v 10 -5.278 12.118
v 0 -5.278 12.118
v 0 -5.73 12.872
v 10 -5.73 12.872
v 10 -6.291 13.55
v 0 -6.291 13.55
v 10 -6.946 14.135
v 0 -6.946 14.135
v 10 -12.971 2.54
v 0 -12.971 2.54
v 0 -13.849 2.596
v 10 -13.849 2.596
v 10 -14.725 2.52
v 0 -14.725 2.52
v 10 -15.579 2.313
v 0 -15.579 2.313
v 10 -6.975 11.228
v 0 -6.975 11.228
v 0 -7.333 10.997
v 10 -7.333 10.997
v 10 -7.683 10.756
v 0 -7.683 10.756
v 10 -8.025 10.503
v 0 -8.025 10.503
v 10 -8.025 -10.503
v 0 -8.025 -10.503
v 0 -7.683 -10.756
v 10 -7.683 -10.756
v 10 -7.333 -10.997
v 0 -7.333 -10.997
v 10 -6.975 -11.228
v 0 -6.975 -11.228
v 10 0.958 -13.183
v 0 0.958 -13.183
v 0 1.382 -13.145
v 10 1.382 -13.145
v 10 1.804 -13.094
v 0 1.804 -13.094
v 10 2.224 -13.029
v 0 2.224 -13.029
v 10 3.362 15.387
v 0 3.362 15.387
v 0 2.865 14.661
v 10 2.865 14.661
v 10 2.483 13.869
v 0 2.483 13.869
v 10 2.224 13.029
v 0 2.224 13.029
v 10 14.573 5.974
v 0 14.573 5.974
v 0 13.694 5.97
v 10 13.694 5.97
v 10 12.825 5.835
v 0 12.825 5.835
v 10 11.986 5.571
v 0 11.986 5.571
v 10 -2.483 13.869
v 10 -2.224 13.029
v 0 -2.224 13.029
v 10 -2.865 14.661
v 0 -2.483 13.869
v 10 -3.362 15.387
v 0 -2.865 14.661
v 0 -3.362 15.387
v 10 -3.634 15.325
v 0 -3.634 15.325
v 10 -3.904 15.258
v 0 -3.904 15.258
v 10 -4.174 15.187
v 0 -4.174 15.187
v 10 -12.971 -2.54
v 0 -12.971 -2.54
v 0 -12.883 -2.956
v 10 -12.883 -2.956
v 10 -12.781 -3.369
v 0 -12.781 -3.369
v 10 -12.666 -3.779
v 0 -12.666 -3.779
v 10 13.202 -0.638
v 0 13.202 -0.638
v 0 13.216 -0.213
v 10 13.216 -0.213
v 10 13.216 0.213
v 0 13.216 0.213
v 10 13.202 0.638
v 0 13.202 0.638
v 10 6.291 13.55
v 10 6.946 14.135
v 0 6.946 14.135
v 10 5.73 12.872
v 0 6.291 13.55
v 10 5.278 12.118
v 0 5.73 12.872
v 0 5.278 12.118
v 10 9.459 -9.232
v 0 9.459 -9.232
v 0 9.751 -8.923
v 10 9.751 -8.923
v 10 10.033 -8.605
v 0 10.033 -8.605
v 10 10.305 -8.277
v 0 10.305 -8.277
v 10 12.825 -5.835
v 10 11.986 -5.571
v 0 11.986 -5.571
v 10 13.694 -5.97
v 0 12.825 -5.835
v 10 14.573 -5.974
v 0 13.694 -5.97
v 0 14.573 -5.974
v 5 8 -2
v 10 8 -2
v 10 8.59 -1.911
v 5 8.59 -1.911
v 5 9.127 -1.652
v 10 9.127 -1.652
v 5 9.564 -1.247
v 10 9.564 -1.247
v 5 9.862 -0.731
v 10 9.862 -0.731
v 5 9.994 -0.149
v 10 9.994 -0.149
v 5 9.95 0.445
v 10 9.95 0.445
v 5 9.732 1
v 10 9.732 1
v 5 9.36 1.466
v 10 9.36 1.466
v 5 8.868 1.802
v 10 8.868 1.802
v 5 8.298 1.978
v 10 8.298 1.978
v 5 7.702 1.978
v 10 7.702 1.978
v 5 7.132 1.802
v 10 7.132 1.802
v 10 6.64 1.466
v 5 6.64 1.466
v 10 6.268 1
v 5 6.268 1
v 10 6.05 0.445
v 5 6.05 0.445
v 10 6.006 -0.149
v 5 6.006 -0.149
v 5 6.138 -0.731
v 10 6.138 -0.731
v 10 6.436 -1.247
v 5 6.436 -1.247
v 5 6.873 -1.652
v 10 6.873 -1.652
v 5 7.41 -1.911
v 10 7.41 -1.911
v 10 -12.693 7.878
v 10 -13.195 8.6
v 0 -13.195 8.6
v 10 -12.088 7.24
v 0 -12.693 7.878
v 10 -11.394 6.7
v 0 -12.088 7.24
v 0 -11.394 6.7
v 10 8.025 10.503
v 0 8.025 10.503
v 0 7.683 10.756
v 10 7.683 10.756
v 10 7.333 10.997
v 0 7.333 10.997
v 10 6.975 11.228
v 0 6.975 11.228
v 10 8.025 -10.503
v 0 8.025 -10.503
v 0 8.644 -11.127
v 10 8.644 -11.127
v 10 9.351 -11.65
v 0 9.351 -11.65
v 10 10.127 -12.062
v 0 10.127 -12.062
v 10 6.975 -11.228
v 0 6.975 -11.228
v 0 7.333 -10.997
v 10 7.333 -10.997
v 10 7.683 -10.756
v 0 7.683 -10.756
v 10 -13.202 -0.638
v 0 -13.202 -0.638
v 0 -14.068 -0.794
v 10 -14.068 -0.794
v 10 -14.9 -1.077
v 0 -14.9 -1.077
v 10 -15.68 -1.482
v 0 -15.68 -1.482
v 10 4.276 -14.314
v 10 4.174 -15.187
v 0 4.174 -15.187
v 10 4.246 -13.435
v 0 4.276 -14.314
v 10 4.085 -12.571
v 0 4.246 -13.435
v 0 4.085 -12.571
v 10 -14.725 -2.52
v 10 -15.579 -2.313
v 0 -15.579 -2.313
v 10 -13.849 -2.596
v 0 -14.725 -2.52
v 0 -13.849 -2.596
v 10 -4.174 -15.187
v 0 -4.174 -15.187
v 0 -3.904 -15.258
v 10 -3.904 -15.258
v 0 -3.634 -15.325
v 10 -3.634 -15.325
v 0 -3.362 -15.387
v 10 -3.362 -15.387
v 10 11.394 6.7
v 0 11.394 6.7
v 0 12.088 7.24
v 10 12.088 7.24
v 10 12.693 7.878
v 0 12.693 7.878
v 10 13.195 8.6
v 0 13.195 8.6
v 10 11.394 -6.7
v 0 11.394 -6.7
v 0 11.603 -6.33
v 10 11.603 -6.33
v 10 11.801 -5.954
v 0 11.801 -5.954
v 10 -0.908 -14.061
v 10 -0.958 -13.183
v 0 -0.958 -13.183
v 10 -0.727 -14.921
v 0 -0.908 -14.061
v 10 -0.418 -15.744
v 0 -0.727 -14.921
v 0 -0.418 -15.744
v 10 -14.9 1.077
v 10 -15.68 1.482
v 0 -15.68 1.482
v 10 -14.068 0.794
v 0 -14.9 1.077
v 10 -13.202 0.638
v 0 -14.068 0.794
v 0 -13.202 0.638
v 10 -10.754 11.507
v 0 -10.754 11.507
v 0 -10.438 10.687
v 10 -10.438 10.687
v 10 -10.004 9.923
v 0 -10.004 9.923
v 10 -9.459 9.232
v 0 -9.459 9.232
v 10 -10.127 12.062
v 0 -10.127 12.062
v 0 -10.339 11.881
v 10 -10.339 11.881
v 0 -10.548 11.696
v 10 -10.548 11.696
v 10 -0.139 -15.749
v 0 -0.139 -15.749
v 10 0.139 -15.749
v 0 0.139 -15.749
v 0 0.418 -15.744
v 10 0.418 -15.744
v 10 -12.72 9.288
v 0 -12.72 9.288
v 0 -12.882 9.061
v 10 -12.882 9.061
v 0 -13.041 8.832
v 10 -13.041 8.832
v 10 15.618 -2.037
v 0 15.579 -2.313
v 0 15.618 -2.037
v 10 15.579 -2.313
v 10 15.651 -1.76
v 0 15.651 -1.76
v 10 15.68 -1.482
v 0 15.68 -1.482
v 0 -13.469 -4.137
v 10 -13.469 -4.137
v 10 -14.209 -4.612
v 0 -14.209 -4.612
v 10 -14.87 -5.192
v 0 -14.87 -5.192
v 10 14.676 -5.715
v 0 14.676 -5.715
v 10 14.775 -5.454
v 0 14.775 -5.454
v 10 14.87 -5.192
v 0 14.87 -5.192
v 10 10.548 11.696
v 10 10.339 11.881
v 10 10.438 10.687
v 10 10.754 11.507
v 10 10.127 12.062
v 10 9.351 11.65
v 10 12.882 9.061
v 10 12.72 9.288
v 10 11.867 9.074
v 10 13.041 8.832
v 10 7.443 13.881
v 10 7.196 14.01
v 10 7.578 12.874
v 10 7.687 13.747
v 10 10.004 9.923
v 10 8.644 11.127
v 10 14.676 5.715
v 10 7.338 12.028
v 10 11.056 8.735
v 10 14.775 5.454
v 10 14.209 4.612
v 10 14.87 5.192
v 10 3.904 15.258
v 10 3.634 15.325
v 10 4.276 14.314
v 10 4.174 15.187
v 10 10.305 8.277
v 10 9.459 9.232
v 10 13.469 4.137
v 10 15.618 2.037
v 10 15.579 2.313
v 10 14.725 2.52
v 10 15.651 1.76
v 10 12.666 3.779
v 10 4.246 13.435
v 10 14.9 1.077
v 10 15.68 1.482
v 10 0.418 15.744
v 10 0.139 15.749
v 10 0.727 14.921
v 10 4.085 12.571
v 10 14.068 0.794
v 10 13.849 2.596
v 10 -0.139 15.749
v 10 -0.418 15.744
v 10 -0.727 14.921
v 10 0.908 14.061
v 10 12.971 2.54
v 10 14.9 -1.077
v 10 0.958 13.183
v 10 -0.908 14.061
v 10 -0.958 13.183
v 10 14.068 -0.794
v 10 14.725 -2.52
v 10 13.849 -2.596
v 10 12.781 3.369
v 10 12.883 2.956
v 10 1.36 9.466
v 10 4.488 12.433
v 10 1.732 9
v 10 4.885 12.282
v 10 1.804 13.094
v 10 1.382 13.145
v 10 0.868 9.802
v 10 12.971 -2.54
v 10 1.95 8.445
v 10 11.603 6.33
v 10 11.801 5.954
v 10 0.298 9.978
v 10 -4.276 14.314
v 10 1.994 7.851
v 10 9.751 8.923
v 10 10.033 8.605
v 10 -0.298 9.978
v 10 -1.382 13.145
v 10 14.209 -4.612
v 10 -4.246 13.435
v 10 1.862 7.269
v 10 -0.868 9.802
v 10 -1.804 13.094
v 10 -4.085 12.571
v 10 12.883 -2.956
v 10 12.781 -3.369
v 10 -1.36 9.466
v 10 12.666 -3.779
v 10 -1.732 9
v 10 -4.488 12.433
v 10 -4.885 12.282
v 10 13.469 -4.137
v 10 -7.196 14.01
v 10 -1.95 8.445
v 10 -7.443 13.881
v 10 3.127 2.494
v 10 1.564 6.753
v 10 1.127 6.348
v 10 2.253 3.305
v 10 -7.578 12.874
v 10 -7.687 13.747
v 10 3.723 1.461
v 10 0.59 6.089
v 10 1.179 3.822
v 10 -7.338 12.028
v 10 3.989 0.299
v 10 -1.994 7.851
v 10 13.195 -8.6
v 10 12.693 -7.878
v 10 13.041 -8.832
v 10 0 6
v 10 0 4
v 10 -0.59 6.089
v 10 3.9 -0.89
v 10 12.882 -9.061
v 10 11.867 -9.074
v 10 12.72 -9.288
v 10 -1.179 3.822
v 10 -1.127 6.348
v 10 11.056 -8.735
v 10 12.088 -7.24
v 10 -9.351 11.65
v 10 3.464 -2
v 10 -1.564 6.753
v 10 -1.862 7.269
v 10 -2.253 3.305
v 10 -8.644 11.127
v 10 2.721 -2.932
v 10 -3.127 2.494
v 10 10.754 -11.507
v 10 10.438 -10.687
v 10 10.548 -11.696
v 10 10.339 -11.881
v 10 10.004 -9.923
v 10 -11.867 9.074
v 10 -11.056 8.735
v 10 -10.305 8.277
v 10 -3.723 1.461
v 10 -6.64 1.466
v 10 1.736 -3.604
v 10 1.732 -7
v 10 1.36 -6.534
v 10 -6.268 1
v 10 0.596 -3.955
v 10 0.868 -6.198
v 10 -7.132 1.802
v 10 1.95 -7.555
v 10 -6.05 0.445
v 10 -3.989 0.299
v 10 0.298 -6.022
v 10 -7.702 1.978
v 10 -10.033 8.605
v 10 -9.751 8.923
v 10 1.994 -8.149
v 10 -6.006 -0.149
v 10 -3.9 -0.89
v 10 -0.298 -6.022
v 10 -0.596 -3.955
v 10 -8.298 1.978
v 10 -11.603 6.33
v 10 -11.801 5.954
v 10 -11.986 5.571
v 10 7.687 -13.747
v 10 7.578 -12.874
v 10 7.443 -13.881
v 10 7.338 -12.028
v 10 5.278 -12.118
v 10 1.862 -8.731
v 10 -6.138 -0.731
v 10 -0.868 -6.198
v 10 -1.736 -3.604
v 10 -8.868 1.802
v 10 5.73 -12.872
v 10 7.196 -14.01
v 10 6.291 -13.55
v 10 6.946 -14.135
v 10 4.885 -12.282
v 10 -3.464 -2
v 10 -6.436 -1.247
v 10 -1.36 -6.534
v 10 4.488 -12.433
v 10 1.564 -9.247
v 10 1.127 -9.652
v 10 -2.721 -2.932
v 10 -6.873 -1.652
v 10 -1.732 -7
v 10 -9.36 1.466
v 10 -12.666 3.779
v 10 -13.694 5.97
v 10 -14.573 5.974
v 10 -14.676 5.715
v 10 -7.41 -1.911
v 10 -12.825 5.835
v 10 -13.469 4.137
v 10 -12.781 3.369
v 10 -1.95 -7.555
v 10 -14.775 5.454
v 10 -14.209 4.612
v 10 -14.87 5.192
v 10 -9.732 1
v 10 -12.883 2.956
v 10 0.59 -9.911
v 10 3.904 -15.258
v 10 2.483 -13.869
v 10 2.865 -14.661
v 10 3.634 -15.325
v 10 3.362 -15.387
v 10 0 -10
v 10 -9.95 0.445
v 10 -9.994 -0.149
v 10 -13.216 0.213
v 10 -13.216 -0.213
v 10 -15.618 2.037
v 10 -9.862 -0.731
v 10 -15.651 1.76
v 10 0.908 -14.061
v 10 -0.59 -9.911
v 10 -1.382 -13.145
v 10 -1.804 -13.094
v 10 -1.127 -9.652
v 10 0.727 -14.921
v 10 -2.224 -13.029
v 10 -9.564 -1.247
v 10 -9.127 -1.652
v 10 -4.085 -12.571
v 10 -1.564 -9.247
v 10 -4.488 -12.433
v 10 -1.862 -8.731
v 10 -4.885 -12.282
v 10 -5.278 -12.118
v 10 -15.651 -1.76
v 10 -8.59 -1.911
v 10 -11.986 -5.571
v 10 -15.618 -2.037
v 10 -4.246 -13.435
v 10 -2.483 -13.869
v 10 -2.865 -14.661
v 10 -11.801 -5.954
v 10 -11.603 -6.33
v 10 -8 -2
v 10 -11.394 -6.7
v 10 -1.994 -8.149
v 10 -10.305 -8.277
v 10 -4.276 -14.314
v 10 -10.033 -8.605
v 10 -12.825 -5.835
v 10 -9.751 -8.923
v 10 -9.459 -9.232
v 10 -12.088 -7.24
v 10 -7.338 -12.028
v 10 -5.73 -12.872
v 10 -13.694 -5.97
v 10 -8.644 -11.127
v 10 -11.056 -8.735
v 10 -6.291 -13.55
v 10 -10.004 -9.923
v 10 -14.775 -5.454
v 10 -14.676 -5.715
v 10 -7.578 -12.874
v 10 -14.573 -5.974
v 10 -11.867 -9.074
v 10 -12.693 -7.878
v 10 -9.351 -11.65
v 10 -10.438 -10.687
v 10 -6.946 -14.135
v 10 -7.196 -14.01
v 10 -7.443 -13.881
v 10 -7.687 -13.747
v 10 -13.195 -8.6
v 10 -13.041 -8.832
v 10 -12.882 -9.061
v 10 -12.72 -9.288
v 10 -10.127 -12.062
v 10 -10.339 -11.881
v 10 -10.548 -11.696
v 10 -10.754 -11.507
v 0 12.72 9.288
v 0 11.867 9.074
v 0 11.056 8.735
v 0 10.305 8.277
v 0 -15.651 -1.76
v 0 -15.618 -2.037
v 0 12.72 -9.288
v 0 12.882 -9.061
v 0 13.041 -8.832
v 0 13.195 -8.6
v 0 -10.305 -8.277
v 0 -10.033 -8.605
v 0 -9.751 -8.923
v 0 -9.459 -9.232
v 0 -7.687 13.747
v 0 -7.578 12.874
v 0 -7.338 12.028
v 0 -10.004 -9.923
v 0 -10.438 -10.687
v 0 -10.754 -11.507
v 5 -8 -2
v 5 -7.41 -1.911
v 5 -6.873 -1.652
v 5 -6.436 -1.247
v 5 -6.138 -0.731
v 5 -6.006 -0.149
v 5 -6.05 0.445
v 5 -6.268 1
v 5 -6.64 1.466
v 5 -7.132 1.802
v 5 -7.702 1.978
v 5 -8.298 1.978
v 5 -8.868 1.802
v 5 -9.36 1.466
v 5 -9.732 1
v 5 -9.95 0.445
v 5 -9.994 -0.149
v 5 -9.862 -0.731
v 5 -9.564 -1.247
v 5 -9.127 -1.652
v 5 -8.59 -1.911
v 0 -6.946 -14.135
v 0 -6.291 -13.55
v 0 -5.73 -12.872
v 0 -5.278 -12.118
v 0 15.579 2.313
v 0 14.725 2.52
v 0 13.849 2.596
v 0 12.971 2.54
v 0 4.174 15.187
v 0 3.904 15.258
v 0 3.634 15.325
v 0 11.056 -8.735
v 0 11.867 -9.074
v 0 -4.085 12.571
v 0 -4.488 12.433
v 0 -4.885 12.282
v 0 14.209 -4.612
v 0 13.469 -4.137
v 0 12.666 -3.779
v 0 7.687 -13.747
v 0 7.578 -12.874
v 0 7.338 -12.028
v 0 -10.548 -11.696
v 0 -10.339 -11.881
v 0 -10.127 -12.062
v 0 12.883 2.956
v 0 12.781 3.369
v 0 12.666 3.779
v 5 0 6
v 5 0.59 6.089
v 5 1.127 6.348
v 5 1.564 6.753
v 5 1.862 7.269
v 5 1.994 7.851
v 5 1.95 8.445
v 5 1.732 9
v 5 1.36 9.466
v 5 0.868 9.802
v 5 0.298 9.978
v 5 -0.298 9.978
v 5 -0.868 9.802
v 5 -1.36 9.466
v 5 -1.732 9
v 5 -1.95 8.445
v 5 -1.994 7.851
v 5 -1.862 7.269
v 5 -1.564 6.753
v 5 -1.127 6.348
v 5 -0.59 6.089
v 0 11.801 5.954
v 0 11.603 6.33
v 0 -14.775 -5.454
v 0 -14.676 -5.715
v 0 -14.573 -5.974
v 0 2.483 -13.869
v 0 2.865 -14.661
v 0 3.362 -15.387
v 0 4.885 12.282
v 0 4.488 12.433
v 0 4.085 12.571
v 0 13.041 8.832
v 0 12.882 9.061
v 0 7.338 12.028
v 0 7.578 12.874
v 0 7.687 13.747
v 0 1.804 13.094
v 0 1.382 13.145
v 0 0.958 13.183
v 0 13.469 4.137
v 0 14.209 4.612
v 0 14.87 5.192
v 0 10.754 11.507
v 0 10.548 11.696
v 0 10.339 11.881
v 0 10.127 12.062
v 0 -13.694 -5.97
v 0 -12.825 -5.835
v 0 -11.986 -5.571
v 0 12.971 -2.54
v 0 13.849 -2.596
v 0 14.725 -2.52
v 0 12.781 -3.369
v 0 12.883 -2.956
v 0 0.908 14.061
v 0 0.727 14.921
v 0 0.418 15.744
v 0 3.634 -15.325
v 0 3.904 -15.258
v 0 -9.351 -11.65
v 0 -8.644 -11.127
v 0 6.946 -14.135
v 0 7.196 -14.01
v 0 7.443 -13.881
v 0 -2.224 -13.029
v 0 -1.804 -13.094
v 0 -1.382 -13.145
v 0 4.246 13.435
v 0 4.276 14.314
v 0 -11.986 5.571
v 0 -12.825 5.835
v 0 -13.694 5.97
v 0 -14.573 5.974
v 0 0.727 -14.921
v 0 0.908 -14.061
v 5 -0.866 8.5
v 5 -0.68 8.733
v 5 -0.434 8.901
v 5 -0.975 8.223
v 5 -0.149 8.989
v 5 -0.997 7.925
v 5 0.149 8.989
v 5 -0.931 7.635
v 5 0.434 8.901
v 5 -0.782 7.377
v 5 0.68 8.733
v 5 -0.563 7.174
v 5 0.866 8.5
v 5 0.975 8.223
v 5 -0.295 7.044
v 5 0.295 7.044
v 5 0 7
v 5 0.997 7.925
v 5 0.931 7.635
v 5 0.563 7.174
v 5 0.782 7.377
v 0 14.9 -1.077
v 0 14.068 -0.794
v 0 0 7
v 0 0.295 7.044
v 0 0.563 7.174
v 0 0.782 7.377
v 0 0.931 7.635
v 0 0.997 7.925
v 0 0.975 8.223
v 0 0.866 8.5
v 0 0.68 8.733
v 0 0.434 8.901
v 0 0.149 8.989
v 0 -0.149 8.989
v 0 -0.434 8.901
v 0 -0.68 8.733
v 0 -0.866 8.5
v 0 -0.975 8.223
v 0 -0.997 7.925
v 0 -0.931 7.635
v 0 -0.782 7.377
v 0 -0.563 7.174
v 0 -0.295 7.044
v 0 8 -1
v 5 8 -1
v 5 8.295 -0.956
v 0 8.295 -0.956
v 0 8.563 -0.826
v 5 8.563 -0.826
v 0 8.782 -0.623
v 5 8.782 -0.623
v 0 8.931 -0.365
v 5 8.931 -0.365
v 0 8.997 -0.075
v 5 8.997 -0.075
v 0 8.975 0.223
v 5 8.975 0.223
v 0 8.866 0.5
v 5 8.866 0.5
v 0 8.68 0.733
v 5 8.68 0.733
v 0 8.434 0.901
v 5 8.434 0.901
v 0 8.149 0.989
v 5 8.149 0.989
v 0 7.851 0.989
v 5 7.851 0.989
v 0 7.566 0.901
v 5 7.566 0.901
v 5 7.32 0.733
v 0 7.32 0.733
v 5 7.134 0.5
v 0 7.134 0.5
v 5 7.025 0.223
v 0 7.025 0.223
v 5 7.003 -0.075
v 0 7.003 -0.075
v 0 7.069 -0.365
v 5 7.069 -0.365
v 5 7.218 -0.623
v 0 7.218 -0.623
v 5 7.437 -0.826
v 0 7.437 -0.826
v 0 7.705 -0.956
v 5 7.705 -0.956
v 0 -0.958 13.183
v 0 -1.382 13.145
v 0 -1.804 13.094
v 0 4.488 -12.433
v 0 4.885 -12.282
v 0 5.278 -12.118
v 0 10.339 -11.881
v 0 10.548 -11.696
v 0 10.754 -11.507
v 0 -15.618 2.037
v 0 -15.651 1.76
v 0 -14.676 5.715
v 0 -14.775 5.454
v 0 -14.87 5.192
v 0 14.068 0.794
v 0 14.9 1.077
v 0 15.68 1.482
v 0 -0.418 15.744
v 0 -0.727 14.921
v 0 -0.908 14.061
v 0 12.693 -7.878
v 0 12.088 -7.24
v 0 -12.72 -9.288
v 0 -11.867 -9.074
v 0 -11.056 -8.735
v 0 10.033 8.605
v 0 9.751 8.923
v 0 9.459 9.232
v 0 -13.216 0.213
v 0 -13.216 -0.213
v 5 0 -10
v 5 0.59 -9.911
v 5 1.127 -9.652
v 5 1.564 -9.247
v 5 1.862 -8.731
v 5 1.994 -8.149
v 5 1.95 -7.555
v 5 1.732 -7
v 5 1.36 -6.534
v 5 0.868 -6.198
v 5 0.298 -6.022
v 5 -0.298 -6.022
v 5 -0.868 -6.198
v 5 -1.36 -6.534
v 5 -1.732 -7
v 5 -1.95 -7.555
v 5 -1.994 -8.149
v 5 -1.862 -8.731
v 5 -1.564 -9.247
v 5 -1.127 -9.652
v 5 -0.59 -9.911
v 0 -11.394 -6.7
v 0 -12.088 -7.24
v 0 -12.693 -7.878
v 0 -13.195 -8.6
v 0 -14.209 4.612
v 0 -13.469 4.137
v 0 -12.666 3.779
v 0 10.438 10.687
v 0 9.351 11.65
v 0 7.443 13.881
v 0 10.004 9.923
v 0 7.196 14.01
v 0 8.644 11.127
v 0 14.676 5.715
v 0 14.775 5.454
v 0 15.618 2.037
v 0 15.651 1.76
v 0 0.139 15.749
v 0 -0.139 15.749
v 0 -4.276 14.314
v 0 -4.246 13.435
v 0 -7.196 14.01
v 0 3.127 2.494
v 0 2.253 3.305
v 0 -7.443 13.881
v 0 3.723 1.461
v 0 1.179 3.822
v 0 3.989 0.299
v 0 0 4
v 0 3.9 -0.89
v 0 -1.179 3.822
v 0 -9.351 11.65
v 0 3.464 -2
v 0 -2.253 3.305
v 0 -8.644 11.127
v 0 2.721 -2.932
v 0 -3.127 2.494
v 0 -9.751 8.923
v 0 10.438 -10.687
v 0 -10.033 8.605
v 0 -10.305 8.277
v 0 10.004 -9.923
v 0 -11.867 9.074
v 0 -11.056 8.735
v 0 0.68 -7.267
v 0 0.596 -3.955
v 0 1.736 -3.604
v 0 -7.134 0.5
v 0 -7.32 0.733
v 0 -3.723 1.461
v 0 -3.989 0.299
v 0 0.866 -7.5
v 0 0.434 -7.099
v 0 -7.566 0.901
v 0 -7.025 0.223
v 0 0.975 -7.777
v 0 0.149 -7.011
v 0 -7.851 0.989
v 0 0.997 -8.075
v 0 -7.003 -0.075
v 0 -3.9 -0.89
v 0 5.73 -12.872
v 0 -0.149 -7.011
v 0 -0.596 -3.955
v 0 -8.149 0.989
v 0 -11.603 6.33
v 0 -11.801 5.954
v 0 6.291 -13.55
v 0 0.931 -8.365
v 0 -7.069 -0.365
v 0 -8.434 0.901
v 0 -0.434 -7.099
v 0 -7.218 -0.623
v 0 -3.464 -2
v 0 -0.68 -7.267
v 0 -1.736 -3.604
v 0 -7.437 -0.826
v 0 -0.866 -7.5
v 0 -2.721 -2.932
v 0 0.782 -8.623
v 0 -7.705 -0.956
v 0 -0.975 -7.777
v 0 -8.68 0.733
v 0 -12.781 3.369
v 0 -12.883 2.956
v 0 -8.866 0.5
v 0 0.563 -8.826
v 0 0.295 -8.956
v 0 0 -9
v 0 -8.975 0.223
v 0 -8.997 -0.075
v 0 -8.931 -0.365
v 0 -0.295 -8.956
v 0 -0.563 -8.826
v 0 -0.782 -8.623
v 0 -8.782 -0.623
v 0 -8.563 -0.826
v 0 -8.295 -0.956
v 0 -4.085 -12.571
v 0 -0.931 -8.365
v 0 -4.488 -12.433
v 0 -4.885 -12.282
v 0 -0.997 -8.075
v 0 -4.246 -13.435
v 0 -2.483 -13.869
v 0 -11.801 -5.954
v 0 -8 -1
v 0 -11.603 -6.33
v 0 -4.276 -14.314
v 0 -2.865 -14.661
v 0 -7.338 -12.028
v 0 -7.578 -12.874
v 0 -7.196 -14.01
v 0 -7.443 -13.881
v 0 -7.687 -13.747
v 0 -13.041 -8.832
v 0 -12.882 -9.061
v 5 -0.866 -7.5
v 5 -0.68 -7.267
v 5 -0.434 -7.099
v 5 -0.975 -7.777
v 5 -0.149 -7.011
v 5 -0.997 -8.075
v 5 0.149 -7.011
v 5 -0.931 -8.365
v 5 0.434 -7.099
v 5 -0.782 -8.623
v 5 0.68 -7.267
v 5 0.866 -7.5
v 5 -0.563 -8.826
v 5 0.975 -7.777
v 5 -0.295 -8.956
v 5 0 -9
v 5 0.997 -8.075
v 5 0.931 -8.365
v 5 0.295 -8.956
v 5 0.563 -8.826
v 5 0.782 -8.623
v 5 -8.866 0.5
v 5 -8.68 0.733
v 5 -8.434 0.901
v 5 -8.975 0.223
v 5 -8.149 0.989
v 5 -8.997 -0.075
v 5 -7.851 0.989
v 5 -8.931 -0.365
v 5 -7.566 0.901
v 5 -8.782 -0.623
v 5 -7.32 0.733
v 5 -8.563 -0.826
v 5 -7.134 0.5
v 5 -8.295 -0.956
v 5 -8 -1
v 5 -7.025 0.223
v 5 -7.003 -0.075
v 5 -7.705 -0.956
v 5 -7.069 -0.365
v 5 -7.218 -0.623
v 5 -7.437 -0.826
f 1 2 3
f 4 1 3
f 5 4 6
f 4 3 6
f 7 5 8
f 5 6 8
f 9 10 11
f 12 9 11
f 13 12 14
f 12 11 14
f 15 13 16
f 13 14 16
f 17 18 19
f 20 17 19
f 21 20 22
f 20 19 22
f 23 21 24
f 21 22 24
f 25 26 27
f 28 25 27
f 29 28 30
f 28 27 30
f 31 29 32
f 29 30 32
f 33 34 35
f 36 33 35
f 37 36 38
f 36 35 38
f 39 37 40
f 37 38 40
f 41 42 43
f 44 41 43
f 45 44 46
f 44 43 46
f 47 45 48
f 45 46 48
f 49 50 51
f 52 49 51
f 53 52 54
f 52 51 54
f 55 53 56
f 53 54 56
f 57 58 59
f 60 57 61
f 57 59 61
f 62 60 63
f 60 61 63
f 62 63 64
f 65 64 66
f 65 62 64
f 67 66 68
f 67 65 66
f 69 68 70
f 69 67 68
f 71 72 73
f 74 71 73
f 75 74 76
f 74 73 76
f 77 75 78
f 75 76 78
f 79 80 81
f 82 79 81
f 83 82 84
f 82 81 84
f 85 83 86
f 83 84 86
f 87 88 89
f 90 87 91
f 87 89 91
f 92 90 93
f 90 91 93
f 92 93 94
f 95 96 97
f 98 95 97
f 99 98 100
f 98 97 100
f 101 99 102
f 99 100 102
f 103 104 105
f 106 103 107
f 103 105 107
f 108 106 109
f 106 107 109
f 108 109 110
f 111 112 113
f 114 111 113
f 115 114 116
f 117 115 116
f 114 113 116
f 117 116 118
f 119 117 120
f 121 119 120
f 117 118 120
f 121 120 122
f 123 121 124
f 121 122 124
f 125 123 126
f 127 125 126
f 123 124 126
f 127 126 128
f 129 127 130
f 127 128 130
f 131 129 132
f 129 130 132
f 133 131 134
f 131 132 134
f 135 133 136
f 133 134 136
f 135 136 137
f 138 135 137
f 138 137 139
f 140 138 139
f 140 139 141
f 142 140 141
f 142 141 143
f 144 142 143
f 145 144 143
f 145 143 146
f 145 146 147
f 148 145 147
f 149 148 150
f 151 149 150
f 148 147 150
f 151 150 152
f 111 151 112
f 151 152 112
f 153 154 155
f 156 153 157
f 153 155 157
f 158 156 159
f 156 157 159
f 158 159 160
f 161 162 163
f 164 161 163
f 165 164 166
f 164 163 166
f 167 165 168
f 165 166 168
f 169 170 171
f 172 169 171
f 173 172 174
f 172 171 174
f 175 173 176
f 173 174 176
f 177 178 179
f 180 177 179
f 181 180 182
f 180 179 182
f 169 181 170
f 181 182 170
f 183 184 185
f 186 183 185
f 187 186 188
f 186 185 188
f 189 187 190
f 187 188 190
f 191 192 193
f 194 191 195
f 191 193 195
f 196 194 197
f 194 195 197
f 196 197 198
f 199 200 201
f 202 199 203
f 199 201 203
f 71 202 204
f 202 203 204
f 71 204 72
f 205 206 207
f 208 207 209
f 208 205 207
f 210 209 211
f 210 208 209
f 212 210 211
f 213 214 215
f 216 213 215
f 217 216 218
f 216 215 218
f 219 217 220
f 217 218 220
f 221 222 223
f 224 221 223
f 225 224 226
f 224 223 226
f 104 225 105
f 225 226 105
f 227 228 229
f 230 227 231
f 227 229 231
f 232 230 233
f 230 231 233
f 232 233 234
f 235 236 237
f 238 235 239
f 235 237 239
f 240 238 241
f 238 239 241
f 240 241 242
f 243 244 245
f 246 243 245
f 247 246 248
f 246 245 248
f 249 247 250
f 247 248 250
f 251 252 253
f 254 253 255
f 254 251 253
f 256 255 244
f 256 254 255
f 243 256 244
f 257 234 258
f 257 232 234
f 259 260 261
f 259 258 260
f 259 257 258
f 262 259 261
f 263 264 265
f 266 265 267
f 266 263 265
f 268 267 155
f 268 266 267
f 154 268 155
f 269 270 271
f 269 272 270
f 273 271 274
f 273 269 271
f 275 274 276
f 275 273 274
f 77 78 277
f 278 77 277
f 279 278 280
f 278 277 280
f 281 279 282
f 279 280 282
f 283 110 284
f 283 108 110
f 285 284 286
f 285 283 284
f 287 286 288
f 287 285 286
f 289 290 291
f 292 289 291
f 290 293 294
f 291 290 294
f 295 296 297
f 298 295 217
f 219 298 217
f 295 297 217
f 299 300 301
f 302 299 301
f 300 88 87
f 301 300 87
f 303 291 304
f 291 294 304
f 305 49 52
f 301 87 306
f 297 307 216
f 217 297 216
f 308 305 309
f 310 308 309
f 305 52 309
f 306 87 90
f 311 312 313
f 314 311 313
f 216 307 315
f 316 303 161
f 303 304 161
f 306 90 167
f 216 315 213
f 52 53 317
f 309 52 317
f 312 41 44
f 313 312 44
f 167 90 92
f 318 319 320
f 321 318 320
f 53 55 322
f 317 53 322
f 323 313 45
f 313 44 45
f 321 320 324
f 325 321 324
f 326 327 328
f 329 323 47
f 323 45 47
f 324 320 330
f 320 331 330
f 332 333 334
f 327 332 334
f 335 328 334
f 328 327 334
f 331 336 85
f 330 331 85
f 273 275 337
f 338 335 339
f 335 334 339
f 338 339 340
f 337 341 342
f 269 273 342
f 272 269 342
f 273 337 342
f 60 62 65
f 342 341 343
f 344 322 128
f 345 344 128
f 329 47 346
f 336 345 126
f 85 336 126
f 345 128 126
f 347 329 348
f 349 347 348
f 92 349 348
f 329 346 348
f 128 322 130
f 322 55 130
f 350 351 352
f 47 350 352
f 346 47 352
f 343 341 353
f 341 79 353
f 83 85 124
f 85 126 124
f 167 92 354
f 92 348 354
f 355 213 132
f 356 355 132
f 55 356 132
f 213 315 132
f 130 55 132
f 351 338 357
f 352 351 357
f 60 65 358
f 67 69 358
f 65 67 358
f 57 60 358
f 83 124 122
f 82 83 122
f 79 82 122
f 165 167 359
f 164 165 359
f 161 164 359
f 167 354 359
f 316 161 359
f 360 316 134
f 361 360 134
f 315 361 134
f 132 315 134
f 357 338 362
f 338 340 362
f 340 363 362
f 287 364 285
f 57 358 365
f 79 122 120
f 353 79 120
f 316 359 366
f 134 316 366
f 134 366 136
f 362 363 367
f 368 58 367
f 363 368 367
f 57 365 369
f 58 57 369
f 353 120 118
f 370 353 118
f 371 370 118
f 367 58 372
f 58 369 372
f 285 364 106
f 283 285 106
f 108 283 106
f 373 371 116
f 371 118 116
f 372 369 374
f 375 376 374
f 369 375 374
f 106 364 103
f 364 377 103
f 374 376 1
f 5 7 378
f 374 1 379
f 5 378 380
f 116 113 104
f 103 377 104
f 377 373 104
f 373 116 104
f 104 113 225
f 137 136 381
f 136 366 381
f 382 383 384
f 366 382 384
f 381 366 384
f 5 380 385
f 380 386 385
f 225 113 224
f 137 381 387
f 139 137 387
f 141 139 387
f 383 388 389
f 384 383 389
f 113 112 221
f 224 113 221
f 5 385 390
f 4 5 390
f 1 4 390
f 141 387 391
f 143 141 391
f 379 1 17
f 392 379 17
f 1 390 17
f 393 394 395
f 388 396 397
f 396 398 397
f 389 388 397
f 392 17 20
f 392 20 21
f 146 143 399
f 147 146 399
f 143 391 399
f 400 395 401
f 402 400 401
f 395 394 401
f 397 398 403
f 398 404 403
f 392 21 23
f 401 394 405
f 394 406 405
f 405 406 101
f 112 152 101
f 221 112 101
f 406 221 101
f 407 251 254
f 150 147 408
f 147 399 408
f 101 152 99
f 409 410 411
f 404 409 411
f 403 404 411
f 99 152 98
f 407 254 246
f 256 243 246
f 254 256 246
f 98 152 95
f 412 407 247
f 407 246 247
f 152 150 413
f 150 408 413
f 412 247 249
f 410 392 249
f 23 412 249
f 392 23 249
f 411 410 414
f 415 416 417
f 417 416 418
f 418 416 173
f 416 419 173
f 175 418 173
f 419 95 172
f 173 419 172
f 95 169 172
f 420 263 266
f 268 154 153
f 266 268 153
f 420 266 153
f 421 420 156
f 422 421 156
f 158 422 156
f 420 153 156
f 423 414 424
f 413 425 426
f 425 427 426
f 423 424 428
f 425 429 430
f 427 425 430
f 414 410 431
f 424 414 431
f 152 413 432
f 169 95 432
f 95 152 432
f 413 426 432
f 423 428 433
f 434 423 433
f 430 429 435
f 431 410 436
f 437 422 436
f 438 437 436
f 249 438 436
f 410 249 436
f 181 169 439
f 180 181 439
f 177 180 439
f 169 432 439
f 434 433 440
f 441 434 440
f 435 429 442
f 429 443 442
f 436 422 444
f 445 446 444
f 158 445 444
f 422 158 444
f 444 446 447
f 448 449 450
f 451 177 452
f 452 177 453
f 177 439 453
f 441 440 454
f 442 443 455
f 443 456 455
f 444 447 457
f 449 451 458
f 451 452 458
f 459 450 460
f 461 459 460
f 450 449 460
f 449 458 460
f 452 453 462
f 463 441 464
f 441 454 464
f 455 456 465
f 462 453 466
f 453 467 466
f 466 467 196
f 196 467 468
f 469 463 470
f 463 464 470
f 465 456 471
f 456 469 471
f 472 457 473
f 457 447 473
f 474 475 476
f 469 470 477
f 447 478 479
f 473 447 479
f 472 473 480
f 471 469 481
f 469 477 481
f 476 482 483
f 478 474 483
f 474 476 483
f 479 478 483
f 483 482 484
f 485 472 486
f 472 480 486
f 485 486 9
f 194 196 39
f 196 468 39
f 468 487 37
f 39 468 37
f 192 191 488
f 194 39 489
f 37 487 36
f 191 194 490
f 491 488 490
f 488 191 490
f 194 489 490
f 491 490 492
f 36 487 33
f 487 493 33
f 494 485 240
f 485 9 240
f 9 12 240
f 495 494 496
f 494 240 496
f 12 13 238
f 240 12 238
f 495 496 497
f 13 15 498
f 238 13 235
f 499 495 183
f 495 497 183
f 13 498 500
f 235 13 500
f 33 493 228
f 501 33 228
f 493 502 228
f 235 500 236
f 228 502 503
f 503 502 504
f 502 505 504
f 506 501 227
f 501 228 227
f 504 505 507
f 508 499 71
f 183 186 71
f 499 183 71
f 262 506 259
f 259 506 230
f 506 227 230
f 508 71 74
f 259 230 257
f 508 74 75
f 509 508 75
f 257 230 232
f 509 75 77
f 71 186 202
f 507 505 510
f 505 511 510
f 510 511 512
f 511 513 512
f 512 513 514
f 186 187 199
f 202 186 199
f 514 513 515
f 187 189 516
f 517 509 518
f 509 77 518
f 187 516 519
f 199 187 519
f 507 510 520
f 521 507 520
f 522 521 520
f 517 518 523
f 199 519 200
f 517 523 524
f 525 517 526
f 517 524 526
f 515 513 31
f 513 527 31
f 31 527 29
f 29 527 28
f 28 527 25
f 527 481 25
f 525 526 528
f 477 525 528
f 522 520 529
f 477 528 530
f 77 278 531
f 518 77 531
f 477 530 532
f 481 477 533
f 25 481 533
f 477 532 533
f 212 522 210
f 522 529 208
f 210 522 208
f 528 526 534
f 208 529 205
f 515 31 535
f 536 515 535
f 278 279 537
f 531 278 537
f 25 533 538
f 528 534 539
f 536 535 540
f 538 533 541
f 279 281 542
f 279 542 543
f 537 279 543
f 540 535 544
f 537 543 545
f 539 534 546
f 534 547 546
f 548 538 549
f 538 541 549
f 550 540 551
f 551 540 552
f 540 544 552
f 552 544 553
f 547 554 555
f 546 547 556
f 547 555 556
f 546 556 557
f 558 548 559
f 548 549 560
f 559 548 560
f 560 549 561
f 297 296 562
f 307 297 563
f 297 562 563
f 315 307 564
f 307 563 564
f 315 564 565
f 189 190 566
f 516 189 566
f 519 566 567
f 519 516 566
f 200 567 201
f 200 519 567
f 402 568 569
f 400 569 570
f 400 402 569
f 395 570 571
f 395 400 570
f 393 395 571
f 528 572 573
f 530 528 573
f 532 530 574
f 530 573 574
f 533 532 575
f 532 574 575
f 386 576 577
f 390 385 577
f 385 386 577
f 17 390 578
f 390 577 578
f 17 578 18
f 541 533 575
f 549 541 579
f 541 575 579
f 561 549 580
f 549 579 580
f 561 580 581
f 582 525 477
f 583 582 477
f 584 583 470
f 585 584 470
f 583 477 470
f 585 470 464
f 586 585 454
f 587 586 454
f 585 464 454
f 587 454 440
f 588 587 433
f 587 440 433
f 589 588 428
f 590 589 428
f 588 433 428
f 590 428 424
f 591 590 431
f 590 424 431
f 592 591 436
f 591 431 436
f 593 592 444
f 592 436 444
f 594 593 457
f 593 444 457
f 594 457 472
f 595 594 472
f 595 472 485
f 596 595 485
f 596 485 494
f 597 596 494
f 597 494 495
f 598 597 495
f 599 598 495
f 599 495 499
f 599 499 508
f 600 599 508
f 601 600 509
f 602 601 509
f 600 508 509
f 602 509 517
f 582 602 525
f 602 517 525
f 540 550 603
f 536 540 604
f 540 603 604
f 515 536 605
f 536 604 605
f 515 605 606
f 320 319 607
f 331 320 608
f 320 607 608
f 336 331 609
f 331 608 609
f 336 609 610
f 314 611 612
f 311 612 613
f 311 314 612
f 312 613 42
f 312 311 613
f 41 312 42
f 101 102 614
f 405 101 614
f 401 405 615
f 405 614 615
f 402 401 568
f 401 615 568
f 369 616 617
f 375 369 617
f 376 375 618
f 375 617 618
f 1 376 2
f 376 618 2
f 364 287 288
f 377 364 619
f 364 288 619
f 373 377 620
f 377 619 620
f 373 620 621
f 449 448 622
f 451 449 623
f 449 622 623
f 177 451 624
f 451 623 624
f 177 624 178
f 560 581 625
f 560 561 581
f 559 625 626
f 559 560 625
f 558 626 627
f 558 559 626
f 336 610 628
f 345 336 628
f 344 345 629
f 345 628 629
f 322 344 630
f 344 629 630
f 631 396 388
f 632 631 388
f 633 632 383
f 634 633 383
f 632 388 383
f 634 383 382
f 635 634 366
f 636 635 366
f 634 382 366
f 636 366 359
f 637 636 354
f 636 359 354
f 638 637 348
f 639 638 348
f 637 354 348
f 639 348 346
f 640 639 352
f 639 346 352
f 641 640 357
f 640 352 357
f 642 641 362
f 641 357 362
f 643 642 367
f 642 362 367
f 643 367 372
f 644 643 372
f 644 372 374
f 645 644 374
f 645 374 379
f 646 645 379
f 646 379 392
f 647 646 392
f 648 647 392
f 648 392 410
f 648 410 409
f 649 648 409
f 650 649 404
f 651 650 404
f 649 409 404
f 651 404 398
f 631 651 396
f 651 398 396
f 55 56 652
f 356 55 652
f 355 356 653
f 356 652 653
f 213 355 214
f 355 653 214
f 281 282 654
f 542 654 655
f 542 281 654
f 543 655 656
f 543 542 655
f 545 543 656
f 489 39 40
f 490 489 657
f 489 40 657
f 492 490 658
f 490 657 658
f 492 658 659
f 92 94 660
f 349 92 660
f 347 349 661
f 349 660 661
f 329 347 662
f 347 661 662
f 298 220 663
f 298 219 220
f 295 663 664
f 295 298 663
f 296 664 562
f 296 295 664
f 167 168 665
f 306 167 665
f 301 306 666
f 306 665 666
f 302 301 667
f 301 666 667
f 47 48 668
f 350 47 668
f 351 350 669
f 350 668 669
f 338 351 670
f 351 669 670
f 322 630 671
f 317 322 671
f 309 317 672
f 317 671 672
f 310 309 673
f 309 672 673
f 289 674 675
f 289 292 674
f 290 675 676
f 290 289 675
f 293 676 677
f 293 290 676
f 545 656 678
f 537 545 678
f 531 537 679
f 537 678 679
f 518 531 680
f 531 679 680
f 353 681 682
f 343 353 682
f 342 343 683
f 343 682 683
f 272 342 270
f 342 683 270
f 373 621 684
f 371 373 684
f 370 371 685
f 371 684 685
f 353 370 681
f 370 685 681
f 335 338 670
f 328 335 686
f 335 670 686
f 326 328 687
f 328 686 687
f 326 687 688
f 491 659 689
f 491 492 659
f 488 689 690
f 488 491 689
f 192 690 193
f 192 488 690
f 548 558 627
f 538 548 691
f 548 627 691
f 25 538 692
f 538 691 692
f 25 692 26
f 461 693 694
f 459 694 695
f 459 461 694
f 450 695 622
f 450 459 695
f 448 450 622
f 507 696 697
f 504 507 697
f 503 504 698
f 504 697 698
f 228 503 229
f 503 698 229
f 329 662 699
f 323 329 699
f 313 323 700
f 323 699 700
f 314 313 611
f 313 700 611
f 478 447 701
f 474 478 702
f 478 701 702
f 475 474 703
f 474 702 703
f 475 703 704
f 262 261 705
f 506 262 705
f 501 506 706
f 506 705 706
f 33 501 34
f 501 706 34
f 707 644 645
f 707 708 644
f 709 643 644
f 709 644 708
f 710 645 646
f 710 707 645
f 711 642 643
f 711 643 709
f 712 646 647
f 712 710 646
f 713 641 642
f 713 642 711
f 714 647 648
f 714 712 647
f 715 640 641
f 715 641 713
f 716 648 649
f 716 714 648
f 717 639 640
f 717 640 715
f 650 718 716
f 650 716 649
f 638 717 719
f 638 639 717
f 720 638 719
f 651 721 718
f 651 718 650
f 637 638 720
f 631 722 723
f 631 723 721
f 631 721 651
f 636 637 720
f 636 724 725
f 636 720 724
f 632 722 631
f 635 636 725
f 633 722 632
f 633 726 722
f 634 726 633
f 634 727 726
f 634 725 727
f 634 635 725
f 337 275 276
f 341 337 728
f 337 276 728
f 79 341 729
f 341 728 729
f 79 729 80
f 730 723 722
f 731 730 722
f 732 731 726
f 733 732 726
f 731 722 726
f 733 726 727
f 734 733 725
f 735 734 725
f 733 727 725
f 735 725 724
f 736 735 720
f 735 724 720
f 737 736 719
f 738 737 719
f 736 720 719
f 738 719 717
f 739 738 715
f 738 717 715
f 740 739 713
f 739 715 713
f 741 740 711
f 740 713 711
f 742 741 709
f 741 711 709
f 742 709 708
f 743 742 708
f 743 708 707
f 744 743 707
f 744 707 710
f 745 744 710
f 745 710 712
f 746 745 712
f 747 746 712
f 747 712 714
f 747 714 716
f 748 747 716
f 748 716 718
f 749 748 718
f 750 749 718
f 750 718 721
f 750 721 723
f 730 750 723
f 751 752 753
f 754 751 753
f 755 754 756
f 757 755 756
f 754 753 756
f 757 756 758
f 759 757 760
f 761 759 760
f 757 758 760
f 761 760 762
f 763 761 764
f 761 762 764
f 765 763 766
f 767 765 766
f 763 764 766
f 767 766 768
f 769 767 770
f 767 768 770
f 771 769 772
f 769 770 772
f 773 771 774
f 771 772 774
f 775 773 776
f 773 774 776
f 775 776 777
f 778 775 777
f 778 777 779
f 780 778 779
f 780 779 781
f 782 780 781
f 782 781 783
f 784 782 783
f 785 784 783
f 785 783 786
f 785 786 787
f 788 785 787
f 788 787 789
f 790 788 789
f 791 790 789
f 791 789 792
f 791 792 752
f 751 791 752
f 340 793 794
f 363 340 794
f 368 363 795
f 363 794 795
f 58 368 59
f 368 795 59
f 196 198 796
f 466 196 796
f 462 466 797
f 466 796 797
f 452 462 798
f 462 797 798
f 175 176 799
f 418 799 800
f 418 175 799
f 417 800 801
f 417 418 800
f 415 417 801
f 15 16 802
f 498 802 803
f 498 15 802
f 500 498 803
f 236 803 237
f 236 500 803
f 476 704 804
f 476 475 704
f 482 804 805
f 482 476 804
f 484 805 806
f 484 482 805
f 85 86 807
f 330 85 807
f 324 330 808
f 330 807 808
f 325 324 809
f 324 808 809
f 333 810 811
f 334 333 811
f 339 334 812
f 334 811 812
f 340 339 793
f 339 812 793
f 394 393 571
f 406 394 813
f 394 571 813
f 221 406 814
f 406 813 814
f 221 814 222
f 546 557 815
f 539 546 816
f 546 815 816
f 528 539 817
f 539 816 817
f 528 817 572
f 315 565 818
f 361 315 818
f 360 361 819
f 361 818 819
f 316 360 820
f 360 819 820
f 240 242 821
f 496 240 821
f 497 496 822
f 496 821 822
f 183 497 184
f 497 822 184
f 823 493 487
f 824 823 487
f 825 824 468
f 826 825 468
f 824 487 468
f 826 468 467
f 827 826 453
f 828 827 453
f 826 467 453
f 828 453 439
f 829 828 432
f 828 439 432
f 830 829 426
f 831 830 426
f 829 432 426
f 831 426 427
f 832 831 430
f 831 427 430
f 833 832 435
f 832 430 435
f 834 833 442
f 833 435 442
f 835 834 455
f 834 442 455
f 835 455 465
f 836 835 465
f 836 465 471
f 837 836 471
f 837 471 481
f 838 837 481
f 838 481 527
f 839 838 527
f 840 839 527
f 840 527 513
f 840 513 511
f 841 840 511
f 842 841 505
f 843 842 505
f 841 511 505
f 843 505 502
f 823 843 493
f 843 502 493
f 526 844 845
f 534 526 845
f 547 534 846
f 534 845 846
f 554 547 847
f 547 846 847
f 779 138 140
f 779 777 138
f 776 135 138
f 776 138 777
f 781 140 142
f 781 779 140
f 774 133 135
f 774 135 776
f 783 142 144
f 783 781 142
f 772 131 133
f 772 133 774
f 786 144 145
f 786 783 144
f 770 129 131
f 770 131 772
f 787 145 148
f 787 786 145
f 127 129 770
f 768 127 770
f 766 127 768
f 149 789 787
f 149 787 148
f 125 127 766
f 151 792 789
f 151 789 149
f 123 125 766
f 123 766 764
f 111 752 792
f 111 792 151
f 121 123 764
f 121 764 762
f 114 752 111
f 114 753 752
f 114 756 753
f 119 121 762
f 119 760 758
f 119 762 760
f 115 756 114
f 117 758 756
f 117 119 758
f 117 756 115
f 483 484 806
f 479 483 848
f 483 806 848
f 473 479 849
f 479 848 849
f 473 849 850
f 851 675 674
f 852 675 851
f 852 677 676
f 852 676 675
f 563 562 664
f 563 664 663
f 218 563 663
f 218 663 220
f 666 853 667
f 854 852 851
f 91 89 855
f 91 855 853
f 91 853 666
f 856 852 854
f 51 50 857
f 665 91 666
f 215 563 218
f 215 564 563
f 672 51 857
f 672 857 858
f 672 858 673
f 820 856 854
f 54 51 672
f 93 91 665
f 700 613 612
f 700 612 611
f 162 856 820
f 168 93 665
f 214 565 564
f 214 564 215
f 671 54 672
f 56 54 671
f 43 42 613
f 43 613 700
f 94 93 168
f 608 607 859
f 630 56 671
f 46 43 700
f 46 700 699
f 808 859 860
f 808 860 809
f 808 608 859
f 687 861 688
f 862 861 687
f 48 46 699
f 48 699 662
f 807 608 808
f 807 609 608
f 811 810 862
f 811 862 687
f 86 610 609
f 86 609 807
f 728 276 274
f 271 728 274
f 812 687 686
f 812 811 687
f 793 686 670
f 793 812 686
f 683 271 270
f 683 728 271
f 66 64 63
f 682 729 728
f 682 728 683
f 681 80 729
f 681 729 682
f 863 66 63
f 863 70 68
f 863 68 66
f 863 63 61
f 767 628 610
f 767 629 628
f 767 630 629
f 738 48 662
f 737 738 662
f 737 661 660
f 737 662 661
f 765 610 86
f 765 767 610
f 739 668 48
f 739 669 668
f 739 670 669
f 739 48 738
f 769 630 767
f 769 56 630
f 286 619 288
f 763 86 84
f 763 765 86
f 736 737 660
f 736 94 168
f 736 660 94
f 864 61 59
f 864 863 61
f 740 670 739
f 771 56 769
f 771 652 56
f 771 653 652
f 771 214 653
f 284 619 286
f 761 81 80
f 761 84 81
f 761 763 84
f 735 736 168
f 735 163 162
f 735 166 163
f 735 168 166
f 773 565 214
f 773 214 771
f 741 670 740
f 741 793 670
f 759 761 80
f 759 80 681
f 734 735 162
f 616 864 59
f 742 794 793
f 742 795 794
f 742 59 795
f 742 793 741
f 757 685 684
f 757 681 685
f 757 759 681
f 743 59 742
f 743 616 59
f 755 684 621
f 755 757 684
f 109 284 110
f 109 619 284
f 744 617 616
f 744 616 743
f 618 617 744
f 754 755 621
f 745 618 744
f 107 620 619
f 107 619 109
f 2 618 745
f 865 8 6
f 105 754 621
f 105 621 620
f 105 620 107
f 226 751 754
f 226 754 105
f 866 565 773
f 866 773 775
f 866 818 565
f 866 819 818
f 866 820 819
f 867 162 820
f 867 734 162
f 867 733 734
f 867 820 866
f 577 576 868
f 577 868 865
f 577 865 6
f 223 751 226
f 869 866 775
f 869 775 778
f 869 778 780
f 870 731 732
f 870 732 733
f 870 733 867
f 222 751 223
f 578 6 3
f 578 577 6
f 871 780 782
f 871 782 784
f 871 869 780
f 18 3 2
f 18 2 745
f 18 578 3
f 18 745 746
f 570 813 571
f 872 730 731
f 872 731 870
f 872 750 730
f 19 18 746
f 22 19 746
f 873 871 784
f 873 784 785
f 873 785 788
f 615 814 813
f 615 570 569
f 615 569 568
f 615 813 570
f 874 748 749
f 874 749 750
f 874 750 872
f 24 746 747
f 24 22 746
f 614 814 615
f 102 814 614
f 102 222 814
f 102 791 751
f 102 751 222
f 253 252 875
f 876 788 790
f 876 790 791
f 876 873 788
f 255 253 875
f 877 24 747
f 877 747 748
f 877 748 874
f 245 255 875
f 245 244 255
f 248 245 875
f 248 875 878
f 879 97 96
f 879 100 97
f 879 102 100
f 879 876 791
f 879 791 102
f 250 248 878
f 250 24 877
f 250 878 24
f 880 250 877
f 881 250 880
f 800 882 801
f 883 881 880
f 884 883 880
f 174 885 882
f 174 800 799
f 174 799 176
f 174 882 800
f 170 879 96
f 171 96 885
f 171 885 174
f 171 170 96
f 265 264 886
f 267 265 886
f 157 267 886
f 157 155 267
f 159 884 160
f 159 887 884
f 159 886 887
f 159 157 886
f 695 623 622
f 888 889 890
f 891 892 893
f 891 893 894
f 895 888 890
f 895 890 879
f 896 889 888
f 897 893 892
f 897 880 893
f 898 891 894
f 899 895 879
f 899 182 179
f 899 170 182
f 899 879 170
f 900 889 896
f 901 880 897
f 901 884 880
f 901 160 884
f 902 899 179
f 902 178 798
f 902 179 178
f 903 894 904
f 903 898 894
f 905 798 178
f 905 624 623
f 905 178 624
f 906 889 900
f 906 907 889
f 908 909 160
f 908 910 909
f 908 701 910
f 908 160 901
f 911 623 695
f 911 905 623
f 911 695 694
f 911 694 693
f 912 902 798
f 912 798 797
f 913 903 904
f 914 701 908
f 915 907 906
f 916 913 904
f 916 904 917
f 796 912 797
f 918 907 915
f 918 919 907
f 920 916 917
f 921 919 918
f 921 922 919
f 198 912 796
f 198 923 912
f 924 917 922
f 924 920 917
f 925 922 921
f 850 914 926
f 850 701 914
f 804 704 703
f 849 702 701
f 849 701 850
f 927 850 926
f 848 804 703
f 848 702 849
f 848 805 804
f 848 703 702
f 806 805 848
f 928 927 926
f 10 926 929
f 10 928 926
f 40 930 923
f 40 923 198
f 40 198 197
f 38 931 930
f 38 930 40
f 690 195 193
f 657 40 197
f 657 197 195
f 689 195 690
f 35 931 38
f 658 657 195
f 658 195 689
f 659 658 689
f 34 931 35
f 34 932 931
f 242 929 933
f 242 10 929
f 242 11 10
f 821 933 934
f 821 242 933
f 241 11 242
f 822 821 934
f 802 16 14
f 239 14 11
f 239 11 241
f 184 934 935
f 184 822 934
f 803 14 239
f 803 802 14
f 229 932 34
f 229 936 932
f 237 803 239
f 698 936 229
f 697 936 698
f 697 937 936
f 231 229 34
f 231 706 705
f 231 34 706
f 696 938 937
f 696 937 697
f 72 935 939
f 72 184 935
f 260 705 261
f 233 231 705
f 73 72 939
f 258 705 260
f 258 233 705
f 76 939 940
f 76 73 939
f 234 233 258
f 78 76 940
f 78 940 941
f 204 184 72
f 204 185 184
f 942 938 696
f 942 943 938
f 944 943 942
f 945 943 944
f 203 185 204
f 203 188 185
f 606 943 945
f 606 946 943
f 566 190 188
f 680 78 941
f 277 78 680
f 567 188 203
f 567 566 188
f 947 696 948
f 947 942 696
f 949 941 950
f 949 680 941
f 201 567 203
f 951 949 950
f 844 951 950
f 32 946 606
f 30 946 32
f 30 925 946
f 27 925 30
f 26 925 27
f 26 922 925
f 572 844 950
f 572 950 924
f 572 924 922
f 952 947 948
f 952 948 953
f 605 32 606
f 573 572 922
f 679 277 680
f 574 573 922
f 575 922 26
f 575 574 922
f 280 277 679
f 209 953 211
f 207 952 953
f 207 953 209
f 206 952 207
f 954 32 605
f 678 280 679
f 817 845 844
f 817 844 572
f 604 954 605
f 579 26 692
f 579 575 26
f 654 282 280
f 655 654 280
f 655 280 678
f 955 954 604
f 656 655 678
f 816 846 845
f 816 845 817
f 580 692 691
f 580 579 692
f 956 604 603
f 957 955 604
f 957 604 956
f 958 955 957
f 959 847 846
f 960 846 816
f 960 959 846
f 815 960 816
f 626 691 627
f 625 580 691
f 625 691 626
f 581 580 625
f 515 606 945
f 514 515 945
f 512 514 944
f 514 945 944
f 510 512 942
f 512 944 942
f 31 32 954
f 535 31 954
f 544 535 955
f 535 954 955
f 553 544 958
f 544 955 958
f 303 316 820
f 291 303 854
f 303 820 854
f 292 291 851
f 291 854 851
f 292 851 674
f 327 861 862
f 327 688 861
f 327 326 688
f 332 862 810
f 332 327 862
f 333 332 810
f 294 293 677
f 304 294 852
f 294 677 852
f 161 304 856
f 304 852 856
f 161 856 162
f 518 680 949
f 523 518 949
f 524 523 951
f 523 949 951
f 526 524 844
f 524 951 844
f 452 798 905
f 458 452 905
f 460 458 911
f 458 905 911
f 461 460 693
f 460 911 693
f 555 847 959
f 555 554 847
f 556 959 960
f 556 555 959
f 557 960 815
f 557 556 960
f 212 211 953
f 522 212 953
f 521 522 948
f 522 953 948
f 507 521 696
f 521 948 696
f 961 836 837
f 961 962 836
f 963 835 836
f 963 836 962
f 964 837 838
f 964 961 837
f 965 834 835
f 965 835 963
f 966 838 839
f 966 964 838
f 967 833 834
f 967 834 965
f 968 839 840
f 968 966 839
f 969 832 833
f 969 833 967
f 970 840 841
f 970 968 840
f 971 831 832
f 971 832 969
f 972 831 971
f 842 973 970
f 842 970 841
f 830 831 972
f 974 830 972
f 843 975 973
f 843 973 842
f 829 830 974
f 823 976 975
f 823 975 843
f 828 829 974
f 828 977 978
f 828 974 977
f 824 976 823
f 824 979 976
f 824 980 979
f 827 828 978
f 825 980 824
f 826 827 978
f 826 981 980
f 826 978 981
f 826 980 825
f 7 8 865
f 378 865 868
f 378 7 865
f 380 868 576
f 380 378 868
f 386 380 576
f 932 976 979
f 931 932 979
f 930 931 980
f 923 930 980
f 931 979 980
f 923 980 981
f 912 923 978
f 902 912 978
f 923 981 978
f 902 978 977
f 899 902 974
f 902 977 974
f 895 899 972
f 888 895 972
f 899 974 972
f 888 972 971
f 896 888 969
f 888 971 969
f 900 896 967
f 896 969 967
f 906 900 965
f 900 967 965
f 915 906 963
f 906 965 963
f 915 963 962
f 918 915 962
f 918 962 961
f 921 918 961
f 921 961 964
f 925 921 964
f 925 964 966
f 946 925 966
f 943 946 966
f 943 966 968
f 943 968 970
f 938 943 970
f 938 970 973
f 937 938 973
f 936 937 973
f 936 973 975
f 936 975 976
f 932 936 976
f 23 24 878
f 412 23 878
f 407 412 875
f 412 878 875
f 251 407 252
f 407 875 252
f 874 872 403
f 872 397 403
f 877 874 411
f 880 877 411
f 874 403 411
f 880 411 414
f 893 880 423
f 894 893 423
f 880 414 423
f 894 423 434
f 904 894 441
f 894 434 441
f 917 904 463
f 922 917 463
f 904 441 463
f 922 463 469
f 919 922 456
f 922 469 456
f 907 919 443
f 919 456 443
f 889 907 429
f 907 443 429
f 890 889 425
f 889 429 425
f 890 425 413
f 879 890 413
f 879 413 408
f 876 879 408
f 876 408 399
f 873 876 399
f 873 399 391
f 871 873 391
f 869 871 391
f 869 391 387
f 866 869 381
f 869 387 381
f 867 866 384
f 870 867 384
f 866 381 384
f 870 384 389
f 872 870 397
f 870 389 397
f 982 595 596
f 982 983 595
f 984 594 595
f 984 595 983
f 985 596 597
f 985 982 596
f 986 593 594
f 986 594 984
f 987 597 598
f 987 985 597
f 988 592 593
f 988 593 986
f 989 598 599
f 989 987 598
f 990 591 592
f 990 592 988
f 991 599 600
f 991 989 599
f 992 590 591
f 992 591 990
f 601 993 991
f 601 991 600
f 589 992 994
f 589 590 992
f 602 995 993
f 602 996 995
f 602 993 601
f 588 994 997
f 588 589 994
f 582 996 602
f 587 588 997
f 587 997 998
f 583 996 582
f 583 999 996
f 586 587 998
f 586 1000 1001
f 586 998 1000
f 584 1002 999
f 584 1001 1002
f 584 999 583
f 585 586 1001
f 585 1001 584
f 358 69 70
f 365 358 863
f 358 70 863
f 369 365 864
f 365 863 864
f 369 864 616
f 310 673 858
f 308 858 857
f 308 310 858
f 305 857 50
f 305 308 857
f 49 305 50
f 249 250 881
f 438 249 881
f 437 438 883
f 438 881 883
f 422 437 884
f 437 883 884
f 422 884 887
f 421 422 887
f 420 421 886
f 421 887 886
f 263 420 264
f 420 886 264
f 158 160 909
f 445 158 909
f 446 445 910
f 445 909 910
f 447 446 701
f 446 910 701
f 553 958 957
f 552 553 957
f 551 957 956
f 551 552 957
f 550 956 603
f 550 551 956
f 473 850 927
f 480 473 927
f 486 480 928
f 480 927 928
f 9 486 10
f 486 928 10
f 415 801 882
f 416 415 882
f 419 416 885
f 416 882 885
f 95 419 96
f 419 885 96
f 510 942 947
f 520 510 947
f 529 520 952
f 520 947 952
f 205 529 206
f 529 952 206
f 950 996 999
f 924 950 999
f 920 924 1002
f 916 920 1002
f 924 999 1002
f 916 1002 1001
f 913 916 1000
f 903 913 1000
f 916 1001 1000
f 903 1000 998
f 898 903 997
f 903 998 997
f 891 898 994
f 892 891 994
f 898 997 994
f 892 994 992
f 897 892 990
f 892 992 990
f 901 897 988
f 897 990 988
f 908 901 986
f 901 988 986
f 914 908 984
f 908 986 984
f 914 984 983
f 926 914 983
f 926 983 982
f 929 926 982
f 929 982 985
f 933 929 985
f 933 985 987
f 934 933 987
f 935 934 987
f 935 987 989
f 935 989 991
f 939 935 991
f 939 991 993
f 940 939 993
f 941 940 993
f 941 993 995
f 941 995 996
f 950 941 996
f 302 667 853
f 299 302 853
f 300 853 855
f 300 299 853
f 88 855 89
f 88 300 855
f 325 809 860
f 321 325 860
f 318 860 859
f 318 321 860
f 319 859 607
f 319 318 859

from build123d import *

# Parameters (mm, degrees)
BASPROSKE_W        = 10
BASPROSKE_H        = 15.75
TOOTHCUT_DEPTH     = 25.415671197
TEETHCUTS_COUNT    = 26
TEETHCUTS_ANGLE    = 346.153846154
BORSKE_R           = 4
BORE_DEPTH         = 50.0000508
SKETCH1_R          = 2
CUT_EXTRUDE2_DEPTH = 5
SKETCH2_R          = 1
CUT_EXTRUDE3_DEPTH = 10


with BuildPart() as part:
    # BasProSke → Base-Revolve (revolve)
    with BuildSketch(Plane(origin=(0, 0, 0), x_dir=(1, 0, 0), z_dir=(0, 1, 0)), mode=Mode.PRIVATE) as base_revolve_sk:
        with Locations((5, 7.875)):
            Rectangle(BASPROSKE_W, BASPROSKE_H)
    revolve(base_revolve_sk.sketch.rotate(Axis((-10, 0, 0), (1, 0, 0)), 180), axis=Axis((-10, 0, 0), (1, 0, 0)))

    # TooCutSke → ToothCut (cut, through all)
    with BuildSketch(Plane(origin=(0, 0, 0), x_dir=(0, 0, -1), z_dir=(1, 0, 0))):
        with BuildLine():
            ThreePointArc((0.637727704, 13.202356549), (0, 13.21775), (-0.637727704, 13.202356549))
            ThreePointArc((-0.637727704, 13.202356549), (-0.924330219, 14.50249659), (-1.497477225, 15.704165279))
            ThreePointArc((-1.497477225, 15.704165279), (0, 15.7754), (1.497477225, 15.704165279))
            ThreePointArc((1.497477225, 15.704165279), (0.924330219, 14.50249659), (0.637727704, 13.202356549))
        make_face()
    toothcut = extrude(amount=TOOTHCUT_DEPTH, mode=Mode.SUBTRACT)

    # TeethCuts: ToothCut ×26 about axis
    teethcuts_axis = Axis((-10, 0, 0), (1, 0, 0))
    for i in range(1, TEETHCUTS_COUNT):
        add(toothcut.rotate(teethcuts_axis, i * TEETHCUTS_ANGLE / (TEETHCUTS_COUNT - 1)), mode=Mode.SUBTRACT)

    # BorSke → Bore (cut, symmetric)
    with BuildSketch(Plane(origin=(0, 0, 0), x_dir=(0, 0, -1), z_dir=(1, 0, 0))):
        with Locations(Location((0, 0, 0), (0, 0, 180))):
            Circle(BORSKE_R)
    extrude(amount=BORE_DEPTH, both=True, mode=Mode.SUBTRACT)

    # Sketch1 → Cut-Extrude2 (cut)
    with BuildSketch(Plane(origin=(10, 0, 0), x_dir=(0, 0, -1), z_dir=(1, 0, 0))):
        with Locations((8, 0)):
            Circle(SKETCH1_R)
        with Locations((0, -8)):
            Circle(SKETCH1_R)
        with Locations((-8, 0)):
            Circle(SKETCH1_R)
        with Locations((0, 8)):
            Circle(SKETCH1_R)
    extrude(amount=-CUT_EXTRUDE2_DEPTH, mode=Mode.SUBTRACT)

    # Sketch2 → Cut-Extrude3 (cut)
    with BuildSketch(Plane(origin=(10, 0, 0), x_dir=(0, 0, -1), z_dir=(1, 0, 0))):
        with Locations((8, 0)):
            Circle(SKETCH2_R)
        with Locations((0, -8)):
            Circle(SKETCH2_R)
        with Locations((-8, 0)):
            Circle(SKETCH2_R)
        with Locations((0, 8)):
            Circle(SKETCH2_R)
    extrude(amount=-CUT_EXTRUDE3_DEPTH, mode=Mode.SUBTRACT)


solid = part.part
